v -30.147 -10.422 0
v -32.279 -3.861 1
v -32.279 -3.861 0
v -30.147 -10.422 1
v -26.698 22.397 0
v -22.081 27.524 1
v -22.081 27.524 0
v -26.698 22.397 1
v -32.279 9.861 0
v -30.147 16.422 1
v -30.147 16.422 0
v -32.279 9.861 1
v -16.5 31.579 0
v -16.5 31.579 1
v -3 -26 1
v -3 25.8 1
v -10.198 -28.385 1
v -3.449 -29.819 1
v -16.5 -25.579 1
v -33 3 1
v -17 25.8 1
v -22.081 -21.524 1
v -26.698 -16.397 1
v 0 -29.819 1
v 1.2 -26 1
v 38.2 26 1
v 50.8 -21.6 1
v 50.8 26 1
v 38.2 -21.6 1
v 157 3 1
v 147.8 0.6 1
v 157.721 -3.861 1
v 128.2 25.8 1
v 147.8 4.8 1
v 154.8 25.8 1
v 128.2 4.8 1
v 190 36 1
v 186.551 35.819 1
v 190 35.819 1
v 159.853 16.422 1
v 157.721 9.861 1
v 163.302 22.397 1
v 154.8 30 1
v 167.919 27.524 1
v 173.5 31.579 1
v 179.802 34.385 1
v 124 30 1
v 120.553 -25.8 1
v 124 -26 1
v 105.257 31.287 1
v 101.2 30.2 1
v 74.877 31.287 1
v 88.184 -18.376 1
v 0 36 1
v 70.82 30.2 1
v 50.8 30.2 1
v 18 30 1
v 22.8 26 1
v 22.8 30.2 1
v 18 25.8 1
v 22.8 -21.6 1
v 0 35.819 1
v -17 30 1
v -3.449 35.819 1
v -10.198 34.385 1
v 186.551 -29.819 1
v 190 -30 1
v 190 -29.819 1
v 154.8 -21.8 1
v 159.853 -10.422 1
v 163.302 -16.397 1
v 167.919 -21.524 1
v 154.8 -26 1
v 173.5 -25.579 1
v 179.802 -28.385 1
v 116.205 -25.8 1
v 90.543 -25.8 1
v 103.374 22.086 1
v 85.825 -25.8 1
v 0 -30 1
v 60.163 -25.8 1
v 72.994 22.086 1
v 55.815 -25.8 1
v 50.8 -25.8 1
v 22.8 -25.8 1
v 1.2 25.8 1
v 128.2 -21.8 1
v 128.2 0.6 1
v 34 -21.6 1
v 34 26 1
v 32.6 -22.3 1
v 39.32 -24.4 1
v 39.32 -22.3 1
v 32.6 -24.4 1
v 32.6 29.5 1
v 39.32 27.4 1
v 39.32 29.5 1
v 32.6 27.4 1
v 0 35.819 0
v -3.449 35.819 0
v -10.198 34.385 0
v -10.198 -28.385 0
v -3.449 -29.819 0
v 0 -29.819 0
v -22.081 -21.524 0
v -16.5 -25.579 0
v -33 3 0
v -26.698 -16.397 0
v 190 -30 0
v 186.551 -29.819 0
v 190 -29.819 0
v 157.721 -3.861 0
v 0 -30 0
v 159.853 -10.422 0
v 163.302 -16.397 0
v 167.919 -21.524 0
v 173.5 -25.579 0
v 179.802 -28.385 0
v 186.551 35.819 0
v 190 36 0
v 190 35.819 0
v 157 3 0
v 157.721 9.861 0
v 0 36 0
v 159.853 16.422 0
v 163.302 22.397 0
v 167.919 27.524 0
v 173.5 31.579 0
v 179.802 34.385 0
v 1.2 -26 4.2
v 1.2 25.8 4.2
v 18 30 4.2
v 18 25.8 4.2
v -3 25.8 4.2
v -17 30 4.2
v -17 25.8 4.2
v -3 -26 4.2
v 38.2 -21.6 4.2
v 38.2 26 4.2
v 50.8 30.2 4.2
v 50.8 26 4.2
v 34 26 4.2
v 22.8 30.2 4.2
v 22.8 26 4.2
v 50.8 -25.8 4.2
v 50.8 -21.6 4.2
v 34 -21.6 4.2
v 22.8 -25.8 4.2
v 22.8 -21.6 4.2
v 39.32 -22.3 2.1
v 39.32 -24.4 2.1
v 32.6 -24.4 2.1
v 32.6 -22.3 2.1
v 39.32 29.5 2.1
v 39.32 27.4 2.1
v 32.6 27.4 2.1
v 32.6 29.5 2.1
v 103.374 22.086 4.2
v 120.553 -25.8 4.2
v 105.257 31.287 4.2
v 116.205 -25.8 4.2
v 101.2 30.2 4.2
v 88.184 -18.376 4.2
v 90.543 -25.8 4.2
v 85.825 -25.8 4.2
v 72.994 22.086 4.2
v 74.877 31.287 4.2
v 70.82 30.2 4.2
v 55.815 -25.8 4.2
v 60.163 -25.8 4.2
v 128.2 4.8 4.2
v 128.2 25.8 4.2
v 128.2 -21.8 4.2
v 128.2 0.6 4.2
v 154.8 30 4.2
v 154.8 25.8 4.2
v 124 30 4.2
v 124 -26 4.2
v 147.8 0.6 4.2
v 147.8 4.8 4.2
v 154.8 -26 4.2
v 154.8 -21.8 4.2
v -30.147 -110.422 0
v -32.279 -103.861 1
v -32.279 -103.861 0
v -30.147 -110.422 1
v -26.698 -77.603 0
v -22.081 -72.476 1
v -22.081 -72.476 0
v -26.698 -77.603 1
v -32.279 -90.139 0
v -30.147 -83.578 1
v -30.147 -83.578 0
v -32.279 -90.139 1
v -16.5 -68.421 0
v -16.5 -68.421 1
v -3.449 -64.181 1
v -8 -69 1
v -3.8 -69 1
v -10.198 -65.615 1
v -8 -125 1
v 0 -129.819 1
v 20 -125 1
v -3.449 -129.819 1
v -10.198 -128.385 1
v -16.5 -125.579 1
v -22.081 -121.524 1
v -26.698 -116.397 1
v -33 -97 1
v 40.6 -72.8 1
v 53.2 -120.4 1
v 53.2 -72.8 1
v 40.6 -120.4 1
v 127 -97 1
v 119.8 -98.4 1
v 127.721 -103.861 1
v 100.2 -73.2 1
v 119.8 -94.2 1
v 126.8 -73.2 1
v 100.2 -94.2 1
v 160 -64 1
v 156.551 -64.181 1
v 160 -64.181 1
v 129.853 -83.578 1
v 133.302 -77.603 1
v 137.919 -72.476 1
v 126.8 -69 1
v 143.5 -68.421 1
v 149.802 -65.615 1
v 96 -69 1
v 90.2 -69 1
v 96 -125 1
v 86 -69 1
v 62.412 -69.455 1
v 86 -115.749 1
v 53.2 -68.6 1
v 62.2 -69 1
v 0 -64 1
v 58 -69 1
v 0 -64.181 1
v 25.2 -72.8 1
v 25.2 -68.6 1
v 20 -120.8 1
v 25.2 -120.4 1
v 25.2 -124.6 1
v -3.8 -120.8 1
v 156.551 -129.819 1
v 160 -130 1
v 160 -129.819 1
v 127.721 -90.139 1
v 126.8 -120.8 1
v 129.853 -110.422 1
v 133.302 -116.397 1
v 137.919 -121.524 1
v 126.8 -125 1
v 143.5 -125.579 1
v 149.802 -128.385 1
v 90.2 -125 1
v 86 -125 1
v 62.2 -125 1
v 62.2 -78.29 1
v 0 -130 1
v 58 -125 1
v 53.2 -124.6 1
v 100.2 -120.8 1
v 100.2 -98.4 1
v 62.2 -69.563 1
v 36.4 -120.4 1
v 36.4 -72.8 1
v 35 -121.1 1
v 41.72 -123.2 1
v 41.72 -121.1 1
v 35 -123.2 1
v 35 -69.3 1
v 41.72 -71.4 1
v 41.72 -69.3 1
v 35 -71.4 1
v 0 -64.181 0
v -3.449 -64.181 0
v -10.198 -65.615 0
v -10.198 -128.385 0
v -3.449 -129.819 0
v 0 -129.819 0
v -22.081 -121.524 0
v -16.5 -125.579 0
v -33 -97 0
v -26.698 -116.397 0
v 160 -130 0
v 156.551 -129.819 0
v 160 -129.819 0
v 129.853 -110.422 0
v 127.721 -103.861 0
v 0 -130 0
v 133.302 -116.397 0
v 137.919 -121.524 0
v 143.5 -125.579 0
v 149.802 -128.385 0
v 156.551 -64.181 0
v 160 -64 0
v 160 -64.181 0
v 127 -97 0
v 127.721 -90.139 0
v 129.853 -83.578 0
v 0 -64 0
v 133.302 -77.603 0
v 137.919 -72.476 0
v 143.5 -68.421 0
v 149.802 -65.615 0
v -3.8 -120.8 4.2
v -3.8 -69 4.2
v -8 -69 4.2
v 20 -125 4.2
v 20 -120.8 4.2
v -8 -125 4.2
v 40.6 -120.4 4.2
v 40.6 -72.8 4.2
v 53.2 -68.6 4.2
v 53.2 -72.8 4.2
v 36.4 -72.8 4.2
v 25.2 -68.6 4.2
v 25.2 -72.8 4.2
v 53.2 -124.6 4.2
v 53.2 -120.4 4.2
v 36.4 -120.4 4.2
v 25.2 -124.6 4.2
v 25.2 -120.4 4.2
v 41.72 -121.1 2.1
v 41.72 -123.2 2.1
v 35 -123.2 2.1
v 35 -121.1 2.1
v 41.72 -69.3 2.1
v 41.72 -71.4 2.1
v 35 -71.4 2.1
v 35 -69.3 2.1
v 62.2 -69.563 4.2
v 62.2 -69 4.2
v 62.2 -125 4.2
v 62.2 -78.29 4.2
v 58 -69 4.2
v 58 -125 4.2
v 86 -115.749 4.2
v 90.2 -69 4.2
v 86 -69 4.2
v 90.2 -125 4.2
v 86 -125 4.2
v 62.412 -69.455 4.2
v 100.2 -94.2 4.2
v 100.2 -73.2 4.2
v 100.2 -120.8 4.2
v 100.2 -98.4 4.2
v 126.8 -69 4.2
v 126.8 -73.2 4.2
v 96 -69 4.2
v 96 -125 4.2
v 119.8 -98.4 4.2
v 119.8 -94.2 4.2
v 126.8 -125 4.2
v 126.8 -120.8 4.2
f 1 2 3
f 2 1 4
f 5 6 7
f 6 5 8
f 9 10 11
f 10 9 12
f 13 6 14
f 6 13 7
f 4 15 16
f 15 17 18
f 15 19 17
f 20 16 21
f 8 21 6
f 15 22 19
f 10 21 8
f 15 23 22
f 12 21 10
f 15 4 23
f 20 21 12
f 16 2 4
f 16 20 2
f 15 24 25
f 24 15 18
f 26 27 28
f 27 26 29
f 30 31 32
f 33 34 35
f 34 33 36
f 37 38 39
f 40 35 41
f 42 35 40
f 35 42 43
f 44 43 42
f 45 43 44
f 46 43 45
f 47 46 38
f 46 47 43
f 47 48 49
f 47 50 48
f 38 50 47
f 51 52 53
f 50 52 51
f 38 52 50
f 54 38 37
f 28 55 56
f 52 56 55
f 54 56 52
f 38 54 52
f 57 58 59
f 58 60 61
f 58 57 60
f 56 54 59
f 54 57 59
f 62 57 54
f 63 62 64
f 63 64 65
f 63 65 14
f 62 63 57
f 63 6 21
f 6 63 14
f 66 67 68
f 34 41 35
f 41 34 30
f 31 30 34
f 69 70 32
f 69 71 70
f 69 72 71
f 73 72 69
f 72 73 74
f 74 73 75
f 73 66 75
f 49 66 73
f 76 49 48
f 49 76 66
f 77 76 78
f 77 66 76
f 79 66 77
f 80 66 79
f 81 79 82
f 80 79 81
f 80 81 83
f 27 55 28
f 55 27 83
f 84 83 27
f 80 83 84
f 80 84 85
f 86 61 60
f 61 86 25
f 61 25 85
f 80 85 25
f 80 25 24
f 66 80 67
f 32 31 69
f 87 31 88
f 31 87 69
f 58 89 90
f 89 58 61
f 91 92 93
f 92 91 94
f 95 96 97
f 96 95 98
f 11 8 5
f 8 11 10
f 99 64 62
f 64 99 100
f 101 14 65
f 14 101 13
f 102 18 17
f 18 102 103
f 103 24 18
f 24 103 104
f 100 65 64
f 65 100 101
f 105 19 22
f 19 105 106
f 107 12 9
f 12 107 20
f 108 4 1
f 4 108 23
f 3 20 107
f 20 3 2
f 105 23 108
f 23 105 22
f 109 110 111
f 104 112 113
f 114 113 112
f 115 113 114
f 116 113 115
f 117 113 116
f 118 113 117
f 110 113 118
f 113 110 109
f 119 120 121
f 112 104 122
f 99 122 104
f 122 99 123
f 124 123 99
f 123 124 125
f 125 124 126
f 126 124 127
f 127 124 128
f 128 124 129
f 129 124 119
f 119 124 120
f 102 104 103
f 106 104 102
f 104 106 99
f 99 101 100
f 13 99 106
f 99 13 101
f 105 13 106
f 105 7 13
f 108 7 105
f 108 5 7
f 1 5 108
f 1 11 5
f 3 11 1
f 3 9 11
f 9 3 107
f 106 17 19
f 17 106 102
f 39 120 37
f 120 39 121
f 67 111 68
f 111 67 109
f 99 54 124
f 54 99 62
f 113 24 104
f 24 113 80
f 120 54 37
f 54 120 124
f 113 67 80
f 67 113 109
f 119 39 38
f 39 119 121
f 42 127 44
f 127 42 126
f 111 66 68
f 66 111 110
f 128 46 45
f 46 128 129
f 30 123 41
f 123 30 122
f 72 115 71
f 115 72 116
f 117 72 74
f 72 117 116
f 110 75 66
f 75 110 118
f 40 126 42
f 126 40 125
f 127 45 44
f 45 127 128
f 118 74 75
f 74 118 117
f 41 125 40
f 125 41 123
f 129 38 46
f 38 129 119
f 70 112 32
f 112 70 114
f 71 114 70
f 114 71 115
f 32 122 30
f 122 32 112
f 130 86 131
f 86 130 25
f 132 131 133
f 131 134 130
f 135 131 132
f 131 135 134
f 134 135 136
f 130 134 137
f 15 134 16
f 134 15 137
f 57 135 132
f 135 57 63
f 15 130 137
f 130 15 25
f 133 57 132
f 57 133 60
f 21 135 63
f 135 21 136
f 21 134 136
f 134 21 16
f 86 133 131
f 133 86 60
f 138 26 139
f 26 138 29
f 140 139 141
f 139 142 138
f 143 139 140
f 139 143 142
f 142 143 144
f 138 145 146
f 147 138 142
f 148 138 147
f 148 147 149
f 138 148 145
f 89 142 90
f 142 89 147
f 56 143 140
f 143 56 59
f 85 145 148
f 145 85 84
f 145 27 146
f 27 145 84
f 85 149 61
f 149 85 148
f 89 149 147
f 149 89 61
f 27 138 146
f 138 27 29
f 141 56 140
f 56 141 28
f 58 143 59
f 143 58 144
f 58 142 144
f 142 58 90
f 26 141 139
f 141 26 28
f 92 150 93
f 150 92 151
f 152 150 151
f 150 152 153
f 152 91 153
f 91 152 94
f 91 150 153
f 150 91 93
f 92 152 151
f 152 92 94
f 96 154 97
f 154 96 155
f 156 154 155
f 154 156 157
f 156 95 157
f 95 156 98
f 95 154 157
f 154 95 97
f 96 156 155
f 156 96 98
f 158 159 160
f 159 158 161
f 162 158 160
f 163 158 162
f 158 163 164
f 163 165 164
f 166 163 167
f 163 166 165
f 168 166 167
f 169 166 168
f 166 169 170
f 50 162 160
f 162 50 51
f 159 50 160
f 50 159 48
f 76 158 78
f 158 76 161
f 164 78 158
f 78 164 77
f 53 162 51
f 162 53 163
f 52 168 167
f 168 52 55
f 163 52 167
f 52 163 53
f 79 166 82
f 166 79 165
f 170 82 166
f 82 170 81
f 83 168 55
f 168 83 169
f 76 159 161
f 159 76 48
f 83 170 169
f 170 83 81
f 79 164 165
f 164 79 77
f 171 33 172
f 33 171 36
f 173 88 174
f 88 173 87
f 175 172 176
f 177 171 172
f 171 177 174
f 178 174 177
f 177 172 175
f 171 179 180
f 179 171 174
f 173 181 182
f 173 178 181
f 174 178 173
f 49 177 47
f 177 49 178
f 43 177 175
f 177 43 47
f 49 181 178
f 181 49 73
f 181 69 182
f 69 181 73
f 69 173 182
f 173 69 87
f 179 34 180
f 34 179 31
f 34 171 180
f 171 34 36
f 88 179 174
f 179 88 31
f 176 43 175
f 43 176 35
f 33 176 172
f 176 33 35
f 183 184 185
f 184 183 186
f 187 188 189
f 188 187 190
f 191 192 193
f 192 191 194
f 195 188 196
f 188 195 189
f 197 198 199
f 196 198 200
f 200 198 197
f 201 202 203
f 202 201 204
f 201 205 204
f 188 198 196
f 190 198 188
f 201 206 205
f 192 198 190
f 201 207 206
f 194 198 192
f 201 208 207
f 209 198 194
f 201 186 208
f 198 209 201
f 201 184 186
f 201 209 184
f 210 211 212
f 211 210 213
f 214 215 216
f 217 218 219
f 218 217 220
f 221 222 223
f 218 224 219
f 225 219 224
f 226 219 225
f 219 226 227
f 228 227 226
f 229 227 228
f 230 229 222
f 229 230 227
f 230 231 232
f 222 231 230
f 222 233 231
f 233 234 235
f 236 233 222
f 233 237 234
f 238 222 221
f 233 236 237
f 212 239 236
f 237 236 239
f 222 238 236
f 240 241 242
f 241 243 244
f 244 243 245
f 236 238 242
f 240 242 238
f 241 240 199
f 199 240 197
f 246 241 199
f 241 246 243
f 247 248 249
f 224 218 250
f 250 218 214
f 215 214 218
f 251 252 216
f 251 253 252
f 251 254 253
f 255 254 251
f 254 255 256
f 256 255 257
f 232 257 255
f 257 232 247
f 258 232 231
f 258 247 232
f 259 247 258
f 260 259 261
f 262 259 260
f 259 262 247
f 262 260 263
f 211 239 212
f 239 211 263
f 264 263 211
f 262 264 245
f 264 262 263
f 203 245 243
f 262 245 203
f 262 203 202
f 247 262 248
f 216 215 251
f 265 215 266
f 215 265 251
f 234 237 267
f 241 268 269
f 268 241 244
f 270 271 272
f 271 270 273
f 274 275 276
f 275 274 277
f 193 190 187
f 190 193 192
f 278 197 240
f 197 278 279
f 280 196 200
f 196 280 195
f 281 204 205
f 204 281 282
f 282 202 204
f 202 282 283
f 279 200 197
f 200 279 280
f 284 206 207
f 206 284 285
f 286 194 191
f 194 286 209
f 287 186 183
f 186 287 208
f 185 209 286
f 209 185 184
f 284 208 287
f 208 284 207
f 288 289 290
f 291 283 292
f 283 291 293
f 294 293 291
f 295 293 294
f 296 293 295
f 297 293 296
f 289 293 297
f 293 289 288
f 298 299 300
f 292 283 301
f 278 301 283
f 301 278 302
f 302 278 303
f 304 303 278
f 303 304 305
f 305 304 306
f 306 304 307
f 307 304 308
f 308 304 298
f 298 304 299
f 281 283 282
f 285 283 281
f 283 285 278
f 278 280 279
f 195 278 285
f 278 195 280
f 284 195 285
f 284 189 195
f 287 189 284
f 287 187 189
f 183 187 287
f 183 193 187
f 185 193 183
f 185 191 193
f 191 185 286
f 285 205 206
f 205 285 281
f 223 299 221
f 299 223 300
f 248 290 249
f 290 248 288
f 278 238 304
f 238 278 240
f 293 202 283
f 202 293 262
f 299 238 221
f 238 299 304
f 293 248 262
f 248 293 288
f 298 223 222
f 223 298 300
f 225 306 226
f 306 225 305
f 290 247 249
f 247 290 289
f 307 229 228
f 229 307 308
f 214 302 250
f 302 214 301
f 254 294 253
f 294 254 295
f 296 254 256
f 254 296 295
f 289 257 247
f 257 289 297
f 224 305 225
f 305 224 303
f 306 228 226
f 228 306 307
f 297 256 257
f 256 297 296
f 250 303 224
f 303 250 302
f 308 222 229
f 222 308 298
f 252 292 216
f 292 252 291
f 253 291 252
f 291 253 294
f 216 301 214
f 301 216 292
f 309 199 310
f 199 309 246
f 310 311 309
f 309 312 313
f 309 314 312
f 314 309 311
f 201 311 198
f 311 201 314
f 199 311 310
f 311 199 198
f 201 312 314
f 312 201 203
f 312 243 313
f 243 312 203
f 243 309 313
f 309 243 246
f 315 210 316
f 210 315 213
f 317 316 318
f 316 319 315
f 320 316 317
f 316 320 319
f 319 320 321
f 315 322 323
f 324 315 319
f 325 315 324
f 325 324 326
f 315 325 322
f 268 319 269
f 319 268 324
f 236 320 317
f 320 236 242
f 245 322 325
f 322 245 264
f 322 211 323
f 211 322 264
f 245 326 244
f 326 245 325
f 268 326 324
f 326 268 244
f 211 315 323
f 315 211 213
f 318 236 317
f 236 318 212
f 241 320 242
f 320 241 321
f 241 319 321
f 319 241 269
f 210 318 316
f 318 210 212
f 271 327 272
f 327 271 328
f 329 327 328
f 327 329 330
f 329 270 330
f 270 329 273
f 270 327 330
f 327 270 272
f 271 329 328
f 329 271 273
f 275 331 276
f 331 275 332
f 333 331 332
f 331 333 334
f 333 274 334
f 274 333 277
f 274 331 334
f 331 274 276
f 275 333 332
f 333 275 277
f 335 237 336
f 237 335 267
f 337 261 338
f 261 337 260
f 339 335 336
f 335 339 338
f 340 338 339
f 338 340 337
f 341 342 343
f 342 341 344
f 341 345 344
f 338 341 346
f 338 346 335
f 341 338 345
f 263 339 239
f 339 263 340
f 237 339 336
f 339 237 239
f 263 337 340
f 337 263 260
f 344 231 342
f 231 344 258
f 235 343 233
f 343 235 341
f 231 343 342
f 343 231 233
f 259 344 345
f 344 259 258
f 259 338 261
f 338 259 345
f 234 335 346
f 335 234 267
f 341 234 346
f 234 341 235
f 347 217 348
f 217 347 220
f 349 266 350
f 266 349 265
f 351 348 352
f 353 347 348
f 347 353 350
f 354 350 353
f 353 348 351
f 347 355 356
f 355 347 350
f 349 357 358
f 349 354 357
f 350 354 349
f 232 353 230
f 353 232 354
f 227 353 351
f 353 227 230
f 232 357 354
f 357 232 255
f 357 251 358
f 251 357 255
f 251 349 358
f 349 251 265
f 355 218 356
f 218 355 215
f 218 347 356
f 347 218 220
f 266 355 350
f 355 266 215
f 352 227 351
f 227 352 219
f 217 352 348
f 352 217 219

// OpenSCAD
//Основа
color([0,0,0]){
difference(){
union(){
translate([0,3,0]) cylinder(1,33,33);
translate([0,-30,0]) cube([190,66,1]);
}
translate([190,3,-1]) cylinder(3,33,33);
}
}


color([0,9,0]){
//Time
translate([20,5,0])
union(){
//T
translate([-23,-31,0])
scale(1.4){  
union(){ 
  cube([3,40,3]);
   translate([-10,37,0]) cube([25,3,3]);
}
}


//I
scale(1.4){
translate([10,-22,0])
difference(){
union(){ 
 cube([3,40,3]);
  translate([-8,0,0]) cube([20,3,3]);
  translate([-8,37,0]) cube([20,3,3]);
}
translate([-1,1,0]) cube([4.8,1.5,1.5]);
translate([-1,38,0]) cube([4.8,1.5,1.5]);
}
}

//M
scale(1.4){ 
translate([74,18,0]) 
rotate([0,0,-90])
difference(){
union(){
  translate([0,-16,0]) rotate([0,0,15]) cube([43,3,3]);
  translate([0,-16,0]) rotate([0,0,-15]) cube([43,3,3]);

 translate([0,-37.7,0]) rotate([0,0,15]) cube([43,3,3]);

 translate([0,-37.7,0])
  rotate([0,0,-15]) cube([43,3,3]);
}
 translate([40,-60,0]) cube([5,60,6]);
}
}
//E
translate([104,-31,0])
 scale(1.4){
   union(){ 
    cube([3,40,3]);
    cube([22,3,3]);
     translate([0,19,0]) cube([17,3,3]);
     translate([0,37,0]) cube([22,3,3]);
}
}
}
}


//Основа2
color([0,0,0]){
translate([0,-100,0])
difference(){
union(){
translate([0,3,0]) cylinder(1,33,33);
translate([0,-30,0]) cube([160,66,1]);
}
translate([160,3,-1]) cylinder(3,33,33);
}
}

//Line
color([0,9,0]){
//L
translate([-8,-125,0])
scale(1.4){
union(){ 
 cube([3,40,3]);
 cube([20,3,3]);
}
}

//I
scale(1.4){
translate([26,-89,0])
difference(){
union(){ 
 cube([3,40,3]);
  translate([-8,0,0]) cube([20,3,3]);
  translate([-8,37,0]) cube([20,3,3]);
}
translate([-1,1,0]) cube([4.8,1.5,1.5]);
translate([-1,38,0]) cube([4.8,1.5,1.5]);
}
}

//N
translate([58,-125,0])
scale(1.4){
union(){
 cube([3,40,3]);
 translate([20,0,0,]) cube([3,40,3]);
 translate([20,0,0]) rotate([0,0,27]) cube([3,43,3]);
}
}

//E
translate([96,-125,0])
 scale(1.4){
   union(){ 
    cube([3,40,3]);
    cube([22,3,3]);
     translate([0,19,0]) cube([17,3,3]);
     translate([0,37,0]) cube([22,3,3]);
}
}
}
